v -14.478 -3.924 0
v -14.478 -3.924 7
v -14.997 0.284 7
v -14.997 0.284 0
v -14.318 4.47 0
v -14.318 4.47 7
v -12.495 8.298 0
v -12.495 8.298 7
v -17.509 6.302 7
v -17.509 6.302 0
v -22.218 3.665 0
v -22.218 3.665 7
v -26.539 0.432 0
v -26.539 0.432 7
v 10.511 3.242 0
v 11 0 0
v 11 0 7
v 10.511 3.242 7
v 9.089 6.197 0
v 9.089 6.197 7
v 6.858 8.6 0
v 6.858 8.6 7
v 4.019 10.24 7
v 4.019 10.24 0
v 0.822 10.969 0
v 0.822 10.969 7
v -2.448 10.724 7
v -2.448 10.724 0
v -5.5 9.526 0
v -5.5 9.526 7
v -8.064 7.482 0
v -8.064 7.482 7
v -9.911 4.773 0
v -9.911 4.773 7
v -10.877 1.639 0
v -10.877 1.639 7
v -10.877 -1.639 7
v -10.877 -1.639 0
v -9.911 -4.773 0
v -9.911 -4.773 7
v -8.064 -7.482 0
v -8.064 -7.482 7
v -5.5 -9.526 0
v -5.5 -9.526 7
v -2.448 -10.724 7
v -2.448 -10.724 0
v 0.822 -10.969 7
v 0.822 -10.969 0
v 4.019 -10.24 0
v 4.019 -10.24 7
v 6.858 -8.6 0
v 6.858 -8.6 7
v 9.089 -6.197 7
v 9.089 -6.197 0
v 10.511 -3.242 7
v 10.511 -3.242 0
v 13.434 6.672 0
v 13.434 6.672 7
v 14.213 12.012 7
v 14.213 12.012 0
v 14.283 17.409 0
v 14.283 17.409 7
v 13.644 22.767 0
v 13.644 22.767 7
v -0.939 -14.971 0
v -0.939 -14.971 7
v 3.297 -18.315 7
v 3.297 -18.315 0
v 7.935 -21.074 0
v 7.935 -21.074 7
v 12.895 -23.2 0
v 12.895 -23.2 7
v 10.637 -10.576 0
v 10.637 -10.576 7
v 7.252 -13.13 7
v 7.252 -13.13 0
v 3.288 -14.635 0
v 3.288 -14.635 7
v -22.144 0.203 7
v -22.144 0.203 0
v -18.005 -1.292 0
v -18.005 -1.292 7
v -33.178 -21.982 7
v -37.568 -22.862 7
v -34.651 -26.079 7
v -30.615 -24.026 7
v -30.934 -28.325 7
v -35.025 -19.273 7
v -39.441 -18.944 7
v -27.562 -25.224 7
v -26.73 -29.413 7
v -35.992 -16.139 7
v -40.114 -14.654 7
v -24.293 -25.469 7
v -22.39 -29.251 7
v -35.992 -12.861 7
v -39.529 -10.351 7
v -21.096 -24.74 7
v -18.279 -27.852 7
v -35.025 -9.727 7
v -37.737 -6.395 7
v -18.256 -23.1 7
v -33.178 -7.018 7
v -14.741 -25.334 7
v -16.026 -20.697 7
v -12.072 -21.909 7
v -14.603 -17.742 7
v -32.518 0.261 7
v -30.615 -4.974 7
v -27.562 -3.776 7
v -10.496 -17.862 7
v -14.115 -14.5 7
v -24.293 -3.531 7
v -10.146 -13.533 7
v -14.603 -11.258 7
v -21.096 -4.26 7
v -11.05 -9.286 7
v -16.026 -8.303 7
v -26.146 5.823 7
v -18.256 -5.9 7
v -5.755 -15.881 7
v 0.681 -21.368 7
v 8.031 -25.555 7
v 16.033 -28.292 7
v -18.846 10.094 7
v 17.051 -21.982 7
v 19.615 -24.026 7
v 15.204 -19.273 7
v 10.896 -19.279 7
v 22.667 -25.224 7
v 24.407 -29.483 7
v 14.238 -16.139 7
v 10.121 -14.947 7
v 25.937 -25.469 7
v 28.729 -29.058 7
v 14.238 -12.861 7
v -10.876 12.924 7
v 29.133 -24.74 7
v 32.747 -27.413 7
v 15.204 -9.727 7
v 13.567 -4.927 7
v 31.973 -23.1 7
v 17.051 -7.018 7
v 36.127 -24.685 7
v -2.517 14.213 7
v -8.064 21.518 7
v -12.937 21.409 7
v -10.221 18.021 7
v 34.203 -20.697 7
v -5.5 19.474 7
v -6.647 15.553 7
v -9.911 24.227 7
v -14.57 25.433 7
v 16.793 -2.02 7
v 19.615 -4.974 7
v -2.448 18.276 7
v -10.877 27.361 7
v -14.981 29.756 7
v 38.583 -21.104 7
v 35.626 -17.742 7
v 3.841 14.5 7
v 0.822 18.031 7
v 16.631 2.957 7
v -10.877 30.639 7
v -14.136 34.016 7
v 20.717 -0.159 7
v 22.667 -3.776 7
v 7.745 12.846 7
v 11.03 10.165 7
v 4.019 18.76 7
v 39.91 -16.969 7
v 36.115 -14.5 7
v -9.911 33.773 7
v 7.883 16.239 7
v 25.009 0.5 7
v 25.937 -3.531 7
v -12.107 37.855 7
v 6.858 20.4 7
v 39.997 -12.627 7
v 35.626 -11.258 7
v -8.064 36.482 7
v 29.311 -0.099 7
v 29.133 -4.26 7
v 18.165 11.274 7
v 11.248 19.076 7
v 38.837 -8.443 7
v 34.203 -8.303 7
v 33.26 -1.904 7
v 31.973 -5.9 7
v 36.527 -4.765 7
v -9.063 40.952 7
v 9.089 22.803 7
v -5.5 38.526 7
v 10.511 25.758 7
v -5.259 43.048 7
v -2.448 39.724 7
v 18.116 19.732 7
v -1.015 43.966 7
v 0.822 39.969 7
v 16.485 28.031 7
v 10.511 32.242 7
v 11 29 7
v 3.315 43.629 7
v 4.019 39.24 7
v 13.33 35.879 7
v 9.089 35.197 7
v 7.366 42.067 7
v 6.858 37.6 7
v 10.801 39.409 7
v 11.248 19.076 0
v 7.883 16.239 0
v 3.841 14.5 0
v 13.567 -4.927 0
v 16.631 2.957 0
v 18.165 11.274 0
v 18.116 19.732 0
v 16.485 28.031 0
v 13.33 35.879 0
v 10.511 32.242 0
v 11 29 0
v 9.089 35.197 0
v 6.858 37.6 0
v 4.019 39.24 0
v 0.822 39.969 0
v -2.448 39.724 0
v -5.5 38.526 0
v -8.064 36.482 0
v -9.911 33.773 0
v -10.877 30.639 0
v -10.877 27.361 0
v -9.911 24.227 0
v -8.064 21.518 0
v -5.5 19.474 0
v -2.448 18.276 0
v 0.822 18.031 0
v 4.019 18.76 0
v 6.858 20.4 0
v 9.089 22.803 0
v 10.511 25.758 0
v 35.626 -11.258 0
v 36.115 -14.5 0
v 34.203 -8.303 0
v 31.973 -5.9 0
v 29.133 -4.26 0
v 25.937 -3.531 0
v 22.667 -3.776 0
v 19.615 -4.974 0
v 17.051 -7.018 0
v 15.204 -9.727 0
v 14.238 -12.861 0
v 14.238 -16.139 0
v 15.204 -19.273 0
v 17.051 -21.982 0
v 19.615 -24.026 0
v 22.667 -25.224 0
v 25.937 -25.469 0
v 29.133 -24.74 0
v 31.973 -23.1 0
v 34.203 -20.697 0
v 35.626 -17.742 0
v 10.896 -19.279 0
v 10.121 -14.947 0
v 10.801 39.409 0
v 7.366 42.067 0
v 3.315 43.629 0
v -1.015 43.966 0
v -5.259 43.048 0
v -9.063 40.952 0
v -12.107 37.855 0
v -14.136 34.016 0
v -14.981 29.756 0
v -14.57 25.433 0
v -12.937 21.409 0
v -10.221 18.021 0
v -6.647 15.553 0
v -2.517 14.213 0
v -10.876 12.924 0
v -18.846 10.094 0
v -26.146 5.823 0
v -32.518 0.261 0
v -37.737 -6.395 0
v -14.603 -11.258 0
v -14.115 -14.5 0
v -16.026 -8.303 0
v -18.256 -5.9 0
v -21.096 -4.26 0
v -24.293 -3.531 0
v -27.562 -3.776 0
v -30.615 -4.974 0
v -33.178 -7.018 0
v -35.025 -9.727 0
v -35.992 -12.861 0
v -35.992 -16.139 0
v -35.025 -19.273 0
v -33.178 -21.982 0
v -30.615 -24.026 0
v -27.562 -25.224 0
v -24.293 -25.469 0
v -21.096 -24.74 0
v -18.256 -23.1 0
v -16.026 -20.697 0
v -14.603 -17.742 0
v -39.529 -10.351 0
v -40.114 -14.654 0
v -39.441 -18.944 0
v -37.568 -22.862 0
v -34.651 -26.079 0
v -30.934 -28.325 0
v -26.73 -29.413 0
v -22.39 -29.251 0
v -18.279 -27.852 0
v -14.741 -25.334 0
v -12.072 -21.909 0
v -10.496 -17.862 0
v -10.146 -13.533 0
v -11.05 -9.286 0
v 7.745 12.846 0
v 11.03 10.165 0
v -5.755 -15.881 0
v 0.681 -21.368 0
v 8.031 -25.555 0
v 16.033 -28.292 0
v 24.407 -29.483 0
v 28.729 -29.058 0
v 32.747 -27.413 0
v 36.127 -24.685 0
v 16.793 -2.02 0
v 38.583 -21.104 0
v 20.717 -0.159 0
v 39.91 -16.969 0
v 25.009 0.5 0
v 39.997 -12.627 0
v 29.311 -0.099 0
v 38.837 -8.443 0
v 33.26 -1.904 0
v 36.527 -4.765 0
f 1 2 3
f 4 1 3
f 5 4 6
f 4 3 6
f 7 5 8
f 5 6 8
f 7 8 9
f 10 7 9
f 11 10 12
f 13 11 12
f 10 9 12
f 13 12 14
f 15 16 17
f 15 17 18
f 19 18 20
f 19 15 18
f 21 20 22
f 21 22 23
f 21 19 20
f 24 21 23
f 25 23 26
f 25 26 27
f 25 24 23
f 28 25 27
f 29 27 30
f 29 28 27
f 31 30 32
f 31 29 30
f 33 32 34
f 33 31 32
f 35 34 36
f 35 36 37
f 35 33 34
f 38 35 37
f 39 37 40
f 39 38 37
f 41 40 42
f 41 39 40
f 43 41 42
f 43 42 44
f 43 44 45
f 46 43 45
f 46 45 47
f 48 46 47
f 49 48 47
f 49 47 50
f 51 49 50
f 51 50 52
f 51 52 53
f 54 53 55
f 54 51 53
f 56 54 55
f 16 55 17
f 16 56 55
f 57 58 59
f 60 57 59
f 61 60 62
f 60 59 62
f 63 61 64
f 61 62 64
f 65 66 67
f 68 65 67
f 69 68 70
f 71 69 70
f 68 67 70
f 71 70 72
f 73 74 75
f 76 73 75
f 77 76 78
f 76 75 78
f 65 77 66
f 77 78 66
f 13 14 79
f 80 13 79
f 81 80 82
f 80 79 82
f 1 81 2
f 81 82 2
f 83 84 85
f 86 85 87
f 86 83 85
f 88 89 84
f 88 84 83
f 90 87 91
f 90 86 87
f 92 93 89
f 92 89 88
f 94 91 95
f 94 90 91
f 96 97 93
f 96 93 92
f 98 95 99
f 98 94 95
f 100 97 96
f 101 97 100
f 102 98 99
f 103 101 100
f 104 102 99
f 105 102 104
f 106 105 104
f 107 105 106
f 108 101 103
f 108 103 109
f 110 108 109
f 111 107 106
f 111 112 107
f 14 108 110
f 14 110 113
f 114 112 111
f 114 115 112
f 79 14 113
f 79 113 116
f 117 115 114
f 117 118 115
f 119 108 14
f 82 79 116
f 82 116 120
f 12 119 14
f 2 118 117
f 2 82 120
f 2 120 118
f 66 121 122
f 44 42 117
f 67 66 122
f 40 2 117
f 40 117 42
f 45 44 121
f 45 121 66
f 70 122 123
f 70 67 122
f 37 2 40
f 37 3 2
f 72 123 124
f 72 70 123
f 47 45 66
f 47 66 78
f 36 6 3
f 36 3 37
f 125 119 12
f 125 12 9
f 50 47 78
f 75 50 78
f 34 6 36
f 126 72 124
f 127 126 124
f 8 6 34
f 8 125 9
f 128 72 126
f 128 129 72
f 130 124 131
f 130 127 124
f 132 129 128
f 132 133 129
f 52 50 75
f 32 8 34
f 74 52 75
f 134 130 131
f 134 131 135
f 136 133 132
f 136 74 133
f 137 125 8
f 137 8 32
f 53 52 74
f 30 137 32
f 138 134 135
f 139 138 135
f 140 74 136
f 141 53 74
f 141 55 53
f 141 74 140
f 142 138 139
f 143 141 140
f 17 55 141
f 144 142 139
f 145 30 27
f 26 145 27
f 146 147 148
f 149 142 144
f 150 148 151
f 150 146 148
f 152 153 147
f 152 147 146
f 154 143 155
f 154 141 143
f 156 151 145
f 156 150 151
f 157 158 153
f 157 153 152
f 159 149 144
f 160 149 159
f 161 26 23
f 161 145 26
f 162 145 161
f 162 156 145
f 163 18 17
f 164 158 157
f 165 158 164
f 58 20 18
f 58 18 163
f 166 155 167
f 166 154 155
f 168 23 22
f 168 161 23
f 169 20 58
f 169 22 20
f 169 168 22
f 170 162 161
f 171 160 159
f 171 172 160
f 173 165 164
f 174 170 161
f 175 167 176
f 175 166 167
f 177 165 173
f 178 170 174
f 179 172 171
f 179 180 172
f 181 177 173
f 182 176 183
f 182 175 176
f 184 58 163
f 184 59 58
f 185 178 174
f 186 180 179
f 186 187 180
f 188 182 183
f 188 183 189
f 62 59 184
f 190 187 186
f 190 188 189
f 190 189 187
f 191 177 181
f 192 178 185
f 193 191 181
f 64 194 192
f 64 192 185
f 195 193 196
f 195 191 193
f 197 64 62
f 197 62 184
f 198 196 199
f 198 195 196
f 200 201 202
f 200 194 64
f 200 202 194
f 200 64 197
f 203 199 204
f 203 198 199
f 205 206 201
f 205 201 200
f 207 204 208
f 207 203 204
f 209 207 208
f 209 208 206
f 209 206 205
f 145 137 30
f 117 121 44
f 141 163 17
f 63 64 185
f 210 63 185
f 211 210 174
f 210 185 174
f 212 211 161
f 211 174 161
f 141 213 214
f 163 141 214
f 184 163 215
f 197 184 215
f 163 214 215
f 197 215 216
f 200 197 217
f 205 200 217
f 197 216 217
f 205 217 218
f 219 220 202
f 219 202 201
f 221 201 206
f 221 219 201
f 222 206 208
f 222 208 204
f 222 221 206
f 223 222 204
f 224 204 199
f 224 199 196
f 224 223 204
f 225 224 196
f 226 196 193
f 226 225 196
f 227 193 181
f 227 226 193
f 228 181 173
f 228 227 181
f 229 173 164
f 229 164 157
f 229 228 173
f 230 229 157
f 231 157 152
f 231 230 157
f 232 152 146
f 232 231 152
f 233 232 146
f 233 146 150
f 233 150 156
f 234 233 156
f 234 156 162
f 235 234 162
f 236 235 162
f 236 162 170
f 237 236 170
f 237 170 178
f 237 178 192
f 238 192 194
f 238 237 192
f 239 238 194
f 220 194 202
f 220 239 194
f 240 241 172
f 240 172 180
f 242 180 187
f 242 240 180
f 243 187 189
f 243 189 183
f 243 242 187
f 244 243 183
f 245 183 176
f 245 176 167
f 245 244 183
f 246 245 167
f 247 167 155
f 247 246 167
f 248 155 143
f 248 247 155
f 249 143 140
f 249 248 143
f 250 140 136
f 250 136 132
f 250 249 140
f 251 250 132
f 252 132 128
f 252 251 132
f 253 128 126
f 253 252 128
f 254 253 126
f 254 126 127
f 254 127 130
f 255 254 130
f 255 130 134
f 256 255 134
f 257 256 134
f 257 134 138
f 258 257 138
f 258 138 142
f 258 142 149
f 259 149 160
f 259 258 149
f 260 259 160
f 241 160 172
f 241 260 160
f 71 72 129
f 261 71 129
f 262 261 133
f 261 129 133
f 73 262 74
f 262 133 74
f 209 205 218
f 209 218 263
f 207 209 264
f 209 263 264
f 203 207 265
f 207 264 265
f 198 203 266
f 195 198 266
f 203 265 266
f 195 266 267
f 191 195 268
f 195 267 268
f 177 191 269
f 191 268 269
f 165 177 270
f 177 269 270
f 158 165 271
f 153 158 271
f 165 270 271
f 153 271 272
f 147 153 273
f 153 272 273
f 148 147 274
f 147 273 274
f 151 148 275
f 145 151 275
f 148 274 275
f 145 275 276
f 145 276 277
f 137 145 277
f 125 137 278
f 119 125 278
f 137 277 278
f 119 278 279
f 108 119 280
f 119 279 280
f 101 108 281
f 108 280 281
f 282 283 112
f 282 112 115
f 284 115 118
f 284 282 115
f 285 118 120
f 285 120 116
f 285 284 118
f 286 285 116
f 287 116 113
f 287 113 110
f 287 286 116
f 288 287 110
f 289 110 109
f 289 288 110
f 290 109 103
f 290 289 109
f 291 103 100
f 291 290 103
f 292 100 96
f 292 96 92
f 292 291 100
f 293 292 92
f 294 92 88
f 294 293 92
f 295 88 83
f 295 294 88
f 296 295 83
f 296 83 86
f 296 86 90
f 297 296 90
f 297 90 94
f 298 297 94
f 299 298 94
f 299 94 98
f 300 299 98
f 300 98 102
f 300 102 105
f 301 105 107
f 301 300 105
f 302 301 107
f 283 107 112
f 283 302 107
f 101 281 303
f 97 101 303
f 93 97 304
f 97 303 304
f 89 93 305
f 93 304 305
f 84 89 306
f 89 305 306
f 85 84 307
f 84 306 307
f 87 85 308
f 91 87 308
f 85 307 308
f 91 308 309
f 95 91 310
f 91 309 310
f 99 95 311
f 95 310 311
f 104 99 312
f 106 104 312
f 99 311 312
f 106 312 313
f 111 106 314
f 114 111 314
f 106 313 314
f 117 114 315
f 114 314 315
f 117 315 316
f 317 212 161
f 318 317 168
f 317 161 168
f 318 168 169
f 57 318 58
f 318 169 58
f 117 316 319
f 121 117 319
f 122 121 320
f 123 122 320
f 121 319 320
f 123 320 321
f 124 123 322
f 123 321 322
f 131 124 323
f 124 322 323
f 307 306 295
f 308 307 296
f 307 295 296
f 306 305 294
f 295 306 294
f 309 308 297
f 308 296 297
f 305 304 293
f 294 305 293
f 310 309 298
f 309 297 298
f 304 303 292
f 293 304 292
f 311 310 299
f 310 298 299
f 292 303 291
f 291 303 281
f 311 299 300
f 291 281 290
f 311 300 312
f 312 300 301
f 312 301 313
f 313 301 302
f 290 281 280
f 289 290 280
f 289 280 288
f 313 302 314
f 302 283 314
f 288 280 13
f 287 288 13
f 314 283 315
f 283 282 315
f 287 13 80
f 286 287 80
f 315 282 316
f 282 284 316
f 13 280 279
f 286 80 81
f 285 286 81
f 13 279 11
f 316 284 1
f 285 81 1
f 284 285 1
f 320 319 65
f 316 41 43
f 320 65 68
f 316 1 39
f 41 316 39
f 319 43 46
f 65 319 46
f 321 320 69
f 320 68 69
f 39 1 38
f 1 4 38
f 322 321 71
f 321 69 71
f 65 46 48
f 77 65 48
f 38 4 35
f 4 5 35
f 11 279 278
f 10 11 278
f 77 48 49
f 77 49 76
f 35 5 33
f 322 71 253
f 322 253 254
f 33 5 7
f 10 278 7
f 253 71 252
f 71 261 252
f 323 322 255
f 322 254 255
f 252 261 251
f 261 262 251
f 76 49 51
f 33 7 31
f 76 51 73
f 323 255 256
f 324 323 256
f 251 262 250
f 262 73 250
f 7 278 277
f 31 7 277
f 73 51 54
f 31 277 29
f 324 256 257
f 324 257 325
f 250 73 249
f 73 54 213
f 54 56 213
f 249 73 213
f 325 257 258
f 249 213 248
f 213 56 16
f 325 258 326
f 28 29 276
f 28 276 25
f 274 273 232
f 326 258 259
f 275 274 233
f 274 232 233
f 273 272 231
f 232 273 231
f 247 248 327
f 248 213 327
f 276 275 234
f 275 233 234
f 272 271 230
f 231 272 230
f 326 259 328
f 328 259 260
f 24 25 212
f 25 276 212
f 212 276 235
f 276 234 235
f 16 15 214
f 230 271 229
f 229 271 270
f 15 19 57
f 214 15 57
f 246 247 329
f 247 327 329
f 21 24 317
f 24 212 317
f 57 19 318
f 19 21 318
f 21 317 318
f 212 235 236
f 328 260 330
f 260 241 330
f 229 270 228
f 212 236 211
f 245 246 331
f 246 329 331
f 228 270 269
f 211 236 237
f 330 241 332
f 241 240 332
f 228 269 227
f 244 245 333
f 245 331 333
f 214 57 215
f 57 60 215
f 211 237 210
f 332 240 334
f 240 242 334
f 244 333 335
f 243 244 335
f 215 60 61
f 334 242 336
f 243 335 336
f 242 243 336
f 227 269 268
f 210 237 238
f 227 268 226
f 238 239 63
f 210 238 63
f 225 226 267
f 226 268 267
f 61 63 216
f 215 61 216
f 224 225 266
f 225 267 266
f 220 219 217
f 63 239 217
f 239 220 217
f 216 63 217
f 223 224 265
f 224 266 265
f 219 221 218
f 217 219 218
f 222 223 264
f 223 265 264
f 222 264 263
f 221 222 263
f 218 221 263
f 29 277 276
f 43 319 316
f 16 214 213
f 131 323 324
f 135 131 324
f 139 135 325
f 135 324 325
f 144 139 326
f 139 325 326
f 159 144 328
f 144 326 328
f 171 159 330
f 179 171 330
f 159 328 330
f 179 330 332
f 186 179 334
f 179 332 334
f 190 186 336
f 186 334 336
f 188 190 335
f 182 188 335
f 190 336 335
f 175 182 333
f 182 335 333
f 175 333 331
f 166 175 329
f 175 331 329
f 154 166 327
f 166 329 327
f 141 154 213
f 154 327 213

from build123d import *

# Parameters (mm, degrees)
F0_R     = 11
F1_DEPTH = 7
F3_DEPTH = 25


with BuildPart() as f1:
    # F0 (on Top) → F1 (new body)
    with BuildSketch(Plane.XY):
        with BuildLine():
            ThreePointArc((13.329884, 35.878532), (-12.10717, 37.855305), (-2.516762, 14.212644))
            ThreePointArc((-2.516762, 14.212644), (-22.596858, 8.130298), (-37.736662, -6.395248))
            ThreePointArc((-37.736662, -6.395248), (-26.73007, -29.41277), (-11.050129, -9.285902))
            ThreePointArc((-11.050129, -9.285902), (4.257384, -23.634602), (24.406778, -29.483284))
            ThreePointArc((24.406778, -29.483284), (38.837241, -8.442535), (13.566892, -4.926742))
            ThreePointArc((13.566892, -4.926742), (18.339474, 15.504304), (13.329884, 35.878532))
        make_face()
        with Locations((-25.114737, -14.5)):
            Circle(F0_R, mode=Mode.SUBTRACT)
        with Locations((25.114737, -14.5)):
            Circle(F0_R, mode=Mode.SUBTRACT)
        Circle(F0_R, mode=Mode.SUBTRACT)
        with Locations((0, 29)):
            Circle(F0_R, mode=Mode.SUBTRACT)
    extrude(amount=F1_DEPTH)

    # F2 (on face) → F3 (cut)
    with BuildSketch(Plane.XY.offset(7)):
        with BuildLine():
            ThreePointArc((13.643858, 22.767414), (9.670257, 17.53326), (3.840573, 14.5))
            ThreePointArc((3.840573, 14.5), (9.482877, 11.622179), (13.434387, 6.672125))
            ThreePointArc((13.434387, 6.672125), (14.336761, 14.709389), (13.643858, 22.767414))
        make_face()
        with BuildLine():
            ThreePointArc((-14.477655, -3.923966), (-14.806541, 2.401323), (-12.495423, 8.298458))
            ThreePointArc((-12.495423, 8.298458), (-19.907085, 5.061305), (-26.539088, 0.432221))
            ThreePointArc((-26.539088, 0.432221), (-20.019377, -0.391942), (-14.477655, -3.923966))
        make_face()
        with BuildLine():
            ThreePointArc((10.637082, -10.576034), (5.323663, -14.023502), (-0.938964, -14.970583))
            ThreePointArc((-0.938964, -14.970583), (5.570324, -19.770693), (12.89523, -23.199635))
            ThreePointArc((12.89523, -23.199635), (10.34912, -17.141318), (10.637082, -10.576034))
        make_face()
    extrude(amount=-F3_DEPTH, mode=Mode.SUBTRACT)


solid = f1.part
